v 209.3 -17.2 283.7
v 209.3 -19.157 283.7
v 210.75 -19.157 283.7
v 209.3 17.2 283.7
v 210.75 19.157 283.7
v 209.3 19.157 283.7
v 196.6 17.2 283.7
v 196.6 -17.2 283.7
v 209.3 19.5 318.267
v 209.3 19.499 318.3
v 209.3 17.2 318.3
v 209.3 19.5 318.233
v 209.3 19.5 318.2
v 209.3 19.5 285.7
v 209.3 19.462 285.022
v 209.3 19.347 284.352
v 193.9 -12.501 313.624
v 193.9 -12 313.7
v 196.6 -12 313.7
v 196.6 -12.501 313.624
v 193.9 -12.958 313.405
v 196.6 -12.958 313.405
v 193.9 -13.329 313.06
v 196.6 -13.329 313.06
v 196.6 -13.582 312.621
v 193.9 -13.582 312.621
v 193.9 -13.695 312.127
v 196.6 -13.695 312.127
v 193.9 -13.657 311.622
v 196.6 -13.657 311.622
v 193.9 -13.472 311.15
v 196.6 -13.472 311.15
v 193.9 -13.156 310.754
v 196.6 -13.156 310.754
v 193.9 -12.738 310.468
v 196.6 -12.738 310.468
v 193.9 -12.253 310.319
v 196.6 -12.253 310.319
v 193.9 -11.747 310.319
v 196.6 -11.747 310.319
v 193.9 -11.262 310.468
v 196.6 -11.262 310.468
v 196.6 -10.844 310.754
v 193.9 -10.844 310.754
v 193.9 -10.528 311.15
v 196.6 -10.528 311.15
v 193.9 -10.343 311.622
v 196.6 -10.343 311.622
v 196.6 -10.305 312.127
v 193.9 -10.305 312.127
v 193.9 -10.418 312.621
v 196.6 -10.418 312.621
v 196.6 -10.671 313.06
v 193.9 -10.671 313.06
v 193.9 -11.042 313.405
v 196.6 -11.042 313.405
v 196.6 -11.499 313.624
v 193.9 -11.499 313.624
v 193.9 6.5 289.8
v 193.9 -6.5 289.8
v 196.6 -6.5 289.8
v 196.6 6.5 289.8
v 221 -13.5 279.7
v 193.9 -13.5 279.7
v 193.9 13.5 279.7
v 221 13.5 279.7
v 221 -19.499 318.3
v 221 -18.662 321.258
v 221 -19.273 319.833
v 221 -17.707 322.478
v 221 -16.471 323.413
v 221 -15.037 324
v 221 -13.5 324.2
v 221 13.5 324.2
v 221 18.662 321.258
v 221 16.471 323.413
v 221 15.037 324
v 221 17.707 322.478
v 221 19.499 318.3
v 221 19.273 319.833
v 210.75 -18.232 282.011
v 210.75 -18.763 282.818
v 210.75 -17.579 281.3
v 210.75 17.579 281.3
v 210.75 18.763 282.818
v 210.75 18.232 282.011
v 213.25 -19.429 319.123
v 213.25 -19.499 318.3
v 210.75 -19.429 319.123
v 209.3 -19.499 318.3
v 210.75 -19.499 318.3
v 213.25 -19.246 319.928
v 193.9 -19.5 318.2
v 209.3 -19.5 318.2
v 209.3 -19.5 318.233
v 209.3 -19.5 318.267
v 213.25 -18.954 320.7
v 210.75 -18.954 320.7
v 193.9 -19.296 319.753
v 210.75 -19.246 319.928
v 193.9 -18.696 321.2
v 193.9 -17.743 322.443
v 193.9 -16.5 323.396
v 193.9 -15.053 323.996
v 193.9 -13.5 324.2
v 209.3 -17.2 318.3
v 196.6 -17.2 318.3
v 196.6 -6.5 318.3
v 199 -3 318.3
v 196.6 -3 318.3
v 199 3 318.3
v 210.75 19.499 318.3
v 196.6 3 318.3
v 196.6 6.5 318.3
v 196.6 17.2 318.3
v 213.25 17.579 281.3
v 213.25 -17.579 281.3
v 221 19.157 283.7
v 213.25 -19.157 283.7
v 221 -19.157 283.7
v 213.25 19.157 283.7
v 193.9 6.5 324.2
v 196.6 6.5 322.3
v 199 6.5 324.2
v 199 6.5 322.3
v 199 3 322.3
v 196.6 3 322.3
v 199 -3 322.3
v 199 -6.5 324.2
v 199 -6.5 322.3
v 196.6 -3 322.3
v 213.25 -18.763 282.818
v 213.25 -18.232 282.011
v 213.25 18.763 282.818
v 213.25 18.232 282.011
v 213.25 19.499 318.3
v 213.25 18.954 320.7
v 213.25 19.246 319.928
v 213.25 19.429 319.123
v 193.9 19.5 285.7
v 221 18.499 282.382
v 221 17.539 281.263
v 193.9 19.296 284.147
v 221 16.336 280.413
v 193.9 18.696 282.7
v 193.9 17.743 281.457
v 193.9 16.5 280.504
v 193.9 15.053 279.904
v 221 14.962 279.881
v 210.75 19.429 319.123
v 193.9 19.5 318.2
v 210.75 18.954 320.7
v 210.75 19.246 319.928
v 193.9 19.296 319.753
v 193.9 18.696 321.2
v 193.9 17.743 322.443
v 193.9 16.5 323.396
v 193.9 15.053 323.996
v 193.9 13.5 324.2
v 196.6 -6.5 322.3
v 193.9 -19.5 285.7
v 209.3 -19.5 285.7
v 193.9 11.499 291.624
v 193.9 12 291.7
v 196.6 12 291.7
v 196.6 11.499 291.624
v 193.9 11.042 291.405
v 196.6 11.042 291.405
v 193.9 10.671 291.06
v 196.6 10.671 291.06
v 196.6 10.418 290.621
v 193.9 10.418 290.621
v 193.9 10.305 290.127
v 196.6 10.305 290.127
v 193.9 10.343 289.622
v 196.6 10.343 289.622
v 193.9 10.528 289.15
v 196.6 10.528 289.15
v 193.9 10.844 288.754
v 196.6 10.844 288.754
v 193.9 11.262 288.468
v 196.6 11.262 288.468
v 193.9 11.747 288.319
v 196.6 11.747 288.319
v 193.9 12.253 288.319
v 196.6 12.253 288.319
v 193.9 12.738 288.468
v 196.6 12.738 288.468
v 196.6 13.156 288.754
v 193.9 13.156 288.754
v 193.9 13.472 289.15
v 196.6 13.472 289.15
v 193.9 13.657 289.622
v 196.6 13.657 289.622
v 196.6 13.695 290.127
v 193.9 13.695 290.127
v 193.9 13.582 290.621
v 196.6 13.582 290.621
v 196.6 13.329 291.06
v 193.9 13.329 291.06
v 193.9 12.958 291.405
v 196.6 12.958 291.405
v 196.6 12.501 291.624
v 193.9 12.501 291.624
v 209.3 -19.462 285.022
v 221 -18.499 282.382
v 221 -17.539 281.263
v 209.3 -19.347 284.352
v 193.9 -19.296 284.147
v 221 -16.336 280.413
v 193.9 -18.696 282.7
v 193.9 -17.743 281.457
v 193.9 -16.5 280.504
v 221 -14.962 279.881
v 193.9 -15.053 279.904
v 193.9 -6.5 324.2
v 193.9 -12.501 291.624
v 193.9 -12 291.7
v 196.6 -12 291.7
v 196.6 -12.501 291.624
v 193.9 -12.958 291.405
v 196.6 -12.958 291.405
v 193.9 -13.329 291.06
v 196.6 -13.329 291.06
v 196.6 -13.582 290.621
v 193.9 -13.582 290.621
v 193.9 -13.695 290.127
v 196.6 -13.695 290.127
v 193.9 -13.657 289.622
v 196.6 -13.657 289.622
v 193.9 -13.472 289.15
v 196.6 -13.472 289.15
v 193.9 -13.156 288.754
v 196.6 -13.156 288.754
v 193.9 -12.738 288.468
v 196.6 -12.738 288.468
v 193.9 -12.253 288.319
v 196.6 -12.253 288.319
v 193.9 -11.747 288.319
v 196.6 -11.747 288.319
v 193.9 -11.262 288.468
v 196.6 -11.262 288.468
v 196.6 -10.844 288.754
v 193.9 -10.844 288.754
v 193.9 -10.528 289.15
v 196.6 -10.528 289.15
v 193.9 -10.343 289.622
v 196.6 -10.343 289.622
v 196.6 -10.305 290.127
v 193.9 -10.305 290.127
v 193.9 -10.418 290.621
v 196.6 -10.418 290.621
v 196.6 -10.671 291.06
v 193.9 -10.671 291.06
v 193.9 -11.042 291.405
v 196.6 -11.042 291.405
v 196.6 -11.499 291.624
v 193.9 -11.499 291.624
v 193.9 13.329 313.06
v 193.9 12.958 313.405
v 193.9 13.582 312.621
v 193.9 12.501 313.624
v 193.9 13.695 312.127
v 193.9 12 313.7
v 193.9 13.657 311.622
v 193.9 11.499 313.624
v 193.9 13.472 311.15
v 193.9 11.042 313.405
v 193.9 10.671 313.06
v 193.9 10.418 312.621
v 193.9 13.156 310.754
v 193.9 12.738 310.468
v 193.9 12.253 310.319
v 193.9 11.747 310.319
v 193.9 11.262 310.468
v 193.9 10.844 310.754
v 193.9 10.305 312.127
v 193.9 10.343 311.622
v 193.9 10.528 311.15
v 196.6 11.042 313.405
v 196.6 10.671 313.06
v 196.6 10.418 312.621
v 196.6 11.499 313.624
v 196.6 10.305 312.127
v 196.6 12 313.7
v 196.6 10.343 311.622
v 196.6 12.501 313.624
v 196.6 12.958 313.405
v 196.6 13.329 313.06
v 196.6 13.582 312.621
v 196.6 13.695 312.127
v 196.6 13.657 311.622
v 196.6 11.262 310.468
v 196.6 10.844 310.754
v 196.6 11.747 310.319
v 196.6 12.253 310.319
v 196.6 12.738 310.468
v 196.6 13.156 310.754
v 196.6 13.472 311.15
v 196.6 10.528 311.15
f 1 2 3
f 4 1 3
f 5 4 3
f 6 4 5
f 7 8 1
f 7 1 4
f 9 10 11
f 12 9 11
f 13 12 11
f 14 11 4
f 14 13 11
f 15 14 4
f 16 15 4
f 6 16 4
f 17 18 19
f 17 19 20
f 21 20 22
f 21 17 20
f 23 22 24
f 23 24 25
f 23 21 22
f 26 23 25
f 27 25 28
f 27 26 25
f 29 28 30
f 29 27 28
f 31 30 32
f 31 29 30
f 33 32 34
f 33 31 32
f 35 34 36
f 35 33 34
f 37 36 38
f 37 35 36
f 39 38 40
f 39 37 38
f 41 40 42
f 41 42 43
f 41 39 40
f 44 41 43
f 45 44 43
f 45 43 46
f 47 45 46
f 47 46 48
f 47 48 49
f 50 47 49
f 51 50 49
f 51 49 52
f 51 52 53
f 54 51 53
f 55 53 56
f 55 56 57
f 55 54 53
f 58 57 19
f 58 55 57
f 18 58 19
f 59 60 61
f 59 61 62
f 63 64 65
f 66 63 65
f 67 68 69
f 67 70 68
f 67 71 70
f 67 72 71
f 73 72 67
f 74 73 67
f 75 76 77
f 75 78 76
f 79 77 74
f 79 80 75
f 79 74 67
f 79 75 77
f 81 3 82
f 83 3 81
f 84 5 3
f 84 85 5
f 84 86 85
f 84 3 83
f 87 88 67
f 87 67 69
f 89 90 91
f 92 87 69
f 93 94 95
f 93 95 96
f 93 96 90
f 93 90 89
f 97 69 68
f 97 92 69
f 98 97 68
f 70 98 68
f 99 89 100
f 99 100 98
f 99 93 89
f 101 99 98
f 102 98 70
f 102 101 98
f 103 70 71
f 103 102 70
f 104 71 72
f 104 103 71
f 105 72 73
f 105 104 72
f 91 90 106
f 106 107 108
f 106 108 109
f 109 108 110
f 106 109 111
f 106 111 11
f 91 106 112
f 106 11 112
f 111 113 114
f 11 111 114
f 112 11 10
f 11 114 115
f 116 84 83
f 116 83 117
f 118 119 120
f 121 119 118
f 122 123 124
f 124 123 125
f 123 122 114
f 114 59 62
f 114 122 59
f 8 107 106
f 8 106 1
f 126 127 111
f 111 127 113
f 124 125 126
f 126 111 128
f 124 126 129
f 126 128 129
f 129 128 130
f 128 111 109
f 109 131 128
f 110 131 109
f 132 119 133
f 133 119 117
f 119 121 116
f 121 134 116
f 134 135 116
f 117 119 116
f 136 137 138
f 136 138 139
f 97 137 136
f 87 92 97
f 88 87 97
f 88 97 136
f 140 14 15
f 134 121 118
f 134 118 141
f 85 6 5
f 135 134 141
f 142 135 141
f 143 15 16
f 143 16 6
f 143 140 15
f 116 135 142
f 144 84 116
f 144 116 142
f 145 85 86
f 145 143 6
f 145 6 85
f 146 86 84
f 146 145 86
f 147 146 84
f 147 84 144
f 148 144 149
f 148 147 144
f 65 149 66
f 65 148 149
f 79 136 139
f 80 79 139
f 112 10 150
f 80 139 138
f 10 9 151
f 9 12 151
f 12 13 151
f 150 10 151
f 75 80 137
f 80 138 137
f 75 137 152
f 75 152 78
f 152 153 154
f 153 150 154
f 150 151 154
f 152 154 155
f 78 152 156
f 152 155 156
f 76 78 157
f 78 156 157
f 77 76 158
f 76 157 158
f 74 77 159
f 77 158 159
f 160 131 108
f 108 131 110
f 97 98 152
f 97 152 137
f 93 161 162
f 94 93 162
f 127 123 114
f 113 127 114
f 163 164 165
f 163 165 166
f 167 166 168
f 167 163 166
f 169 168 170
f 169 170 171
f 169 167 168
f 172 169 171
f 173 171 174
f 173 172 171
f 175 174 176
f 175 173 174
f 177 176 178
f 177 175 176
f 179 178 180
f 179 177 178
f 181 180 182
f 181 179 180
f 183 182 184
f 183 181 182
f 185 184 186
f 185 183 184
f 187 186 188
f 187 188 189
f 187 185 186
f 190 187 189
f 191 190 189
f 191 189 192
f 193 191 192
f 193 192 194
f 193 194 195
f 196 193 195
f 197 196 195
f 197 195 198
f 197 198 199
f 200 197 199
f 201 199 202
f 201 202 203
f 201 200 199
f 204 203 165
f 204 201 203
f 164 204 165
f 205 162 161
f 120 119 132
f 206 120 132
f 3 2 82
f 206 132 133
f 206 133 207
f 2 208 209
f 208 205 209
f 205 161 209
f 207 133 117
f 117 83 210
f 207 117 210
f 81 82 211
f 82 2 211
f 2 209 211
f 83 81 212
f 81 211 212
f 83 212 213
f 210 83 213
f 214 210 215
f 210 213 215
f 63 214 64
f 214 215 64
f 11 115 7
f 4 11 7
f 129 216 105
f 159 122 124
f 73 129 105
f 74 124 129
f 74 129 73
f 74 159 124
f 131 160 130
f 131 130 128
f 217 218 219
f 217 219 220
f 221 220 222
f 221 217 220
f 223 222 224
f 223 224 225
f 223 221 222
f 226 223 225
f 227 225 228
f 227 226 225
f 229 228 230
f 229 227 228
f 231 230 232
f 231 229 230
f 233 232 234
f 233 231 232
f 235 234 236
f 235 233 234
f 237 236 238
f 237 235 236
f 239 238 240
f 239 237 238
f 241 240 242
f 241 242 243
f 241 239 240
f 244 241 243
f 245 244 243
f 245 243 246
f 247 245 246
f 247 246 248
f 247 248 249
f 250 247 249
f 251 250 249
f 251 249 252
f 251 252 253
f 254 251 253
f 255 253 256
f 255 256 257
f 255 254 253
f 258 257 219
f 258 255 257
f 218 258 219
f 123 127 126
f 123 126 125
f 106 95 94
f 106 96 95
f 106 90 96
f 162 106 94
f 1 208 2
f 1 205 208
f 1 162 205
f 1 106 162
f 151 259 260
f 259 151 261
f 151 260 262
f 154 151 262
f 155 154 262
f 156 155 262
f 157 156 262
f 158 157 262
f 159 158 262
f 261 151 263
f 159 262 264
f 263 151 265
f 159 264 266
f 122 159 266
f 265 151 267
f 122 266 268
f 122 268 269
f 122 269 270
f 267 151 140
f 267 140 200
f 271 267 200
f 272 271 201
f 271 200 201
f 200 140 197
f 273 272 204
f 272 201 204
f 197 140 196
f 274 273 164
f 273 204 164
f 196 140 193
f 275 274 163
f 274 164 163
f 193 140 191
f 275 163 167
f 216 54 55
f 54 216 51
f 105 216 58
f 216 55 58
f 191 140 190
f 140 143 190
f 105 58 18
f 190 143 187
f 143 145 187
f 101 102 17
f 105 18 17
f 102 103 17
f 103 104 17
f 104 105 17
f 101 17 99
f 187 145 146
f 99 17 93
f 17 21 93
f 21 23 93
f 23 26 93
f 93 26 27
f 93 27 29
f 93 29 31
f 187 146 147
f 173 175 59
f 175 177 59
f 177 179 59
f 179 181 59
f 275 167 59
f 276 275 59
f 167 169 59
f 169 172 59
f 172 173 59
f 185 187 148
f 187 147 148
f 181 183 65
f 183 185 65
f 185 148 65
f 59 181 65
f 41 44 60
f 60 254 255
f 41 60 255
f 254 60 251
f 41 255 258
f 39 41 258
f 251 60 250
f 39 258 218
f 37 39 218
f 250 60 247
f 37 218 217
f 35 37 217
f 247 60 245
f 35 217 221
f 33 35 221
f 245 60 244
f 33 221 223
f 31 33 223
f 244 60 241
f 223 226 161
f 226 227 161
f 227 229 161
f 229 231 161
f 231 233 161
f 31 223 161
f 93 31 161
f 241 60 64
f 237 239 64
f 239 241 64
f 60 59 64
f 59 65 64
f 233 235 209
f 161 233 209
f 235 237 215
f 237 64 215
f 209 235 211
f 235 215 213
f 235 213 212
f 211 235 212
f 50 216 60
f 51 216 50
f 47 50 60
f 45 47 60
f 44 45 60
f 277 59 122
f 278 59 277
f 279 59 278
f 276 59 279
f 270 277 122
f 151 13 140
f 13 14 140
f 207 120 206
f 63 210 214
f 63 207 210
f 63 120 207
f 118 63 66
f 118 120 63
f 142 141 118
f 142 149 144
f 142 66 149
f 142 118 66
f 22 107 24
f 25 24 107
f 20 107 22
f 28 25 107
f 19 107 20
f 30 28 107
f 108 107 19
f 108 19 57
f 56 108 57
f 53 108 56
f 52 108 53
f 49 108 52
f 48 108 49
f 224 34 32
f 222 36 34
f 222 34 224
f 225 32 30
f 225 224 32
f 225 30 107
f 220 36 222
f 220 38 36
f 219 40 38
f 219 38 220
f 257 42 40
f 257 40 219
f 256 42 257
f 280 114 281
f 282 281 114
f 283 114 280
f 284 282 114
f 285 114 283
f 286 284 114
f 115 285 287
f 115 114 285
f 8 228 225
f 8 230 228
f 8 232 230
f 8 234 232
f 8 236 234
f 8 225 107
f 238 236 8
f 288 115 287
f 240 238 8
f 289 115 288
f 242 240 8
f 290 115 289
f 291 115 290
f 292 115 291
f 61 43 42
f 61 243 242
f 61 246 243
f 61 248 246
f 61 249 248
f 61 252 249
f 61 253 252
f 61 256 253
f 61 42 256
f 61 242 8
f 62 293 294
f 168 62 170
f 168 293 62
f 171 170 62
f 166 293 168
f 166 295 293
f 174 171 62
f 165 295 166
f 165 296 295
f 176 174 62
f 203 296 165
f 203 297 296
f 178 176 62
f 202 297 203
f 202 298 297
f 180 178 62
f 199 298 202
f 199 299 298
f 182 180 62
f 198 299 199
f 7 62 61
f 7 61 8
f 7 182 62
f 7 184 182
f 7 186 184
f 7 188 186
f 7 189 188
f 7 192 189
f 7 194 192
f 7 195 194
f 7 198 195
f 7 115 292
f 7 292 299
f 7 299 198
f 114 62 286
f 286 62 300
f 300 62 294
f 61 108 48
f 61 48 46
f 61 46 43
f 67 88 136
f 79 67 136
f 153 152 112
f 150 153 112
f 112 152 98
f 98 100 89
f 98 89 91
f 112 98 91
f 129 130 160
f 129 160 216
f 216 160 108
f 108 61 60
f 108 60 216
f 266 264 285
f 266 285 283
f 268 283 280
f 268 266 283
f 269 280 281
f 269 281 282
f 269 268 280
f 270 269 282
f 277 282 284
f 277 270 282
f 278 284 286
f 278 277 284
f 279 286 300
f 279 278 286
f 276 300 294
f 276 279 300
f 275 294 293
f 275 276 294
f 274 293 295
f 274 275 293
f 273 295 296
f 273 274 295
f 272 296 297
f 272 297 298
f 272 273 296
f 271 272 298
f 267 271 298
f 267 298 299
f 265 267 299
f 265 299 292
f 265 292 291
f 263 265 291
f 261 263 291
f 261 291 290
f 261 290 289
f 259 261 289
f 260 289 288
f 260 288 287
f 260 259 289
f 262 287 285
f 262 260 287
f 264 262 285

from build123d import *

# Parameters (mm, degrees)
SKETCH1_W           = 42.6
SKETCH1_H           = 39
BOSS_EXTRUDE1_DEPTH = 2.7
SKETCH2_W           = 42.6
SKETCH2_H           = 2.3
BOSS_EXTRUDE2_DEPTH = 12.7
SKETCH3_W           = 4
SKETCH3_H           = 39
BOSS_EXTRUDE3_DEPTH = 18.4
SKETCH4_R           = 1.7
SKETCH4_W           = 33.2
SKETCH4_H           = 13
CUT_EXTRUDE1_DEPTH  = 2.7
SKETCH5_W           = 4.7
SKETCH5_H           = 6
CUT_EXTRUDE2_DEPTH  = 2.4
SKETCH6_W           = 2.5
SKETCH6_H           = 2.4
CUT_EXTRUDE3_DEPTH  = 30
SKETCH7_W           = 5.9
SKETCH7_H           = 39
SKETCH7_W_2         = 4
BOSS_EXTRUDE4_DEPTH = 6
BOSS_EXTRUDE5_DEPTH = 1.9
CUT_EXTRUDE4_DEPTH  = 326.914559356


with BuildPart() as part:
    # Sketch1 → Boss-Extrude1 (new body)
    with BuildSketch(Plane(origin=(193.9, 0, 0), x_dir=(0, 0, -1), z_dir=(1, 0, 0))):
        with Locations((-301, 0)):
            Rectangle(SKETCH1_W, SKETCH1_H)
    extrude(amount=BOSS_EXTRUDE1_DEPTH)

    # Sketch2 → Boss-Extrude2 (add)
    with BuildSketch(Plane(origin=(196.6, 0, 0), x_dir=(0, 0, -1), z_dir=(1, 0, 0))):
        with Locations((-301, 18.35)):
            Rectangle(SKETCH2_W, SKETCH2_H)
        with Locations((-301, -18.35)):
            Rectangle(SKETCH2_W, SKETCH2_H)
    extrude(amount=BOSS_EXTRUDE2_DEPTH)

    # Sketch3 → Boss-Extrude3 (add)
    with BuildSketch(Plane(origin=(196.6, 0, 0), x_dir=(0, 0, -1), z_dir=(1, 0, 0))):
        with Locations((-320.3, 0)):
            Rectangle(SKETCH3_W, SKETCH3_H)
        with Locations((-281.7, 0)):
            Rectangle(SKETCH3_W, SKETCH3_H)
    extrude(amount=BOSS_EXTRUDE3_DEPTH)

    # Sketch4 → Cut-Extrude1 (cut)
    with BuildSketch(Plane(origin=(193.9, 0, 0), x_dir=(0, 0, -1), z_dir=(1, 0, 0))):
        with Locations(Location((-290, 12, 0), (0, 0, 180))):
            Circle(SKETCH4_R)
        with Locations(Location((-290, -12, 0), (0, 0, 180))):
            Circle(SKETCH4_R)
        with Locations(Location((-312, 12, 0), (0, 0, 180))):
            Circle(SKETCH4_R)
        with Locations(Location((-312, -12, 0), (0, 0, 180))):
            Circle(SKETCH4_R)
        with Locations((-306.4, 0)):
            Rectangle(SKETCH4_W, SKETCH4_H)
    extrude(amount=CUT_EXTRUDE1_DEPTH, mode=Mode.SUBTRACT)

    # Sketch5 → Cut-Extrude2 (cut)
    with BuildSketch(Plane(origin=(196.6, 0, 0), x_dir=(0, 0, -1), z_dir=(1, 0, 0))):
        with Locations((-320.65, 0)):
            Rectangle(SKETCH5_W, SKETCH5_H)
    extrude(amount=CUT_EXTRUDE2_DEPTH, mode=Mode.SUBTRACT)

    # Sketch6 → Cut-Extrude3 (cut, symmetric)
    with BuildSketch(Plane(origin=(0, 0, 0), x_dir=(1, 0, 0), z_dir=(0, 1, 0))):
        with Locations((212, -319.5)):
            Rectangle(SKETCH6_W, SKETCH6_H)
        with Locations((212, -282.5)):
            Rectangle(SKETCH6_W, SKETCH6_H)
    extrude(amount=CUT_EXTRUDE3_DEPTH, both=True, mode=Mode.SUBTRACT)

    # Sketch7 → Boss-Extrude4 (add)
    with BuildSketch(Plane(origin=(215, 0, 0), x_dir=(0, 0, -1), z_dir=(1, 0, 0))):
        with Locations((-321.25, 0)):
            Rectangle(SKETCH7_W, SKETCH7_H)
        with Locations((-281.7, 0)):
            Rectangle(SKETCH7_W_2, SKETCH7_H)
    extrude(amount=BOSS_EXTRUDE4_DEPTH)

    # Sketch8 → Boss-Extrude5 (add)
    with BuildSketch(Plane.XY.offset(322.3)):
        Polygon((193.9, -19.5), (215, -19.5), (215, 19.5), (193.9, 19.5), (193.9, 6.5), (199, 6.5), (199, -6.5), (193.9, -6.5), align=None)
    extrude(amount=BOSS_EXTRUDE5_DEPTH)

    # Sketch9 → Cut-Extrude4 (cut, through all)
    with BuildSketch(Plane(origin=(193.9, 0, 0), x_dir=(0, 0, -1), z_dir=(1, 0, 0))):
        with BuildLine():
            Line((-324.2, 13.5), (-325.5, 13.5))
            Line((-325.5, 13.5), (-325.5, 20.5))
            Line((-325.5, 20.5), (-318.2, 20.5))
            Line((-318.2, 20.5), (-318.2, 19.5))
            ThreePointArc((-318.2, 19.5), (-322.442640687, 17.742640687), (-324.2, 13.5))
        make_face()
        with BuildLine():
            Line((-324.2, -13.5), (-325.5, -13.5))
            Line((-325.5, -13.5), (-325.5, -20.5))
            Line((-325.5, -20.5), (-318.2, -20.5))
            Line((-318.2, -20.5), (-318.2, -19.5))
            ThreePointArc((-318.2, -19.5), (-322.442640687, -17.742640687), (-324.2, -13.5))
        make_face()
        with BuildLine():
            Line((-279.7, 13.5), (-278.4, 13.5))
            Line((-278.4, 13.5), (-278.4, 20.5))
            Line((-278.4, 20.5), (-285.7, 20.5))
            Line((-285.7, 20.5), (-285.7, 19.5))
            ThreePointArc((-285.7, 19.5), (-281.457359313, 17.742640687), (-279.7, 13.5))
        make_face()
        with BuildLine():
            Line((-279.7, -13.5), (-278.4, -13.5))
            Line((-278.4, -13.5), (-278.4, -20.5))
            Line((-278.4, -20.5), (-285.7, -20.5))
            Line((-285.7, -20.5), (-285.7, -19.5))
            ThreePointArc((-285.7, -19.5), (-281.457359313, -17.742640687), (-279.7, -13.5))
        make_face()
    extrude(amount=CUT_EXTRUDE4_DEPTH, mode=Mode.SUBTRACT)


solid = part.part
